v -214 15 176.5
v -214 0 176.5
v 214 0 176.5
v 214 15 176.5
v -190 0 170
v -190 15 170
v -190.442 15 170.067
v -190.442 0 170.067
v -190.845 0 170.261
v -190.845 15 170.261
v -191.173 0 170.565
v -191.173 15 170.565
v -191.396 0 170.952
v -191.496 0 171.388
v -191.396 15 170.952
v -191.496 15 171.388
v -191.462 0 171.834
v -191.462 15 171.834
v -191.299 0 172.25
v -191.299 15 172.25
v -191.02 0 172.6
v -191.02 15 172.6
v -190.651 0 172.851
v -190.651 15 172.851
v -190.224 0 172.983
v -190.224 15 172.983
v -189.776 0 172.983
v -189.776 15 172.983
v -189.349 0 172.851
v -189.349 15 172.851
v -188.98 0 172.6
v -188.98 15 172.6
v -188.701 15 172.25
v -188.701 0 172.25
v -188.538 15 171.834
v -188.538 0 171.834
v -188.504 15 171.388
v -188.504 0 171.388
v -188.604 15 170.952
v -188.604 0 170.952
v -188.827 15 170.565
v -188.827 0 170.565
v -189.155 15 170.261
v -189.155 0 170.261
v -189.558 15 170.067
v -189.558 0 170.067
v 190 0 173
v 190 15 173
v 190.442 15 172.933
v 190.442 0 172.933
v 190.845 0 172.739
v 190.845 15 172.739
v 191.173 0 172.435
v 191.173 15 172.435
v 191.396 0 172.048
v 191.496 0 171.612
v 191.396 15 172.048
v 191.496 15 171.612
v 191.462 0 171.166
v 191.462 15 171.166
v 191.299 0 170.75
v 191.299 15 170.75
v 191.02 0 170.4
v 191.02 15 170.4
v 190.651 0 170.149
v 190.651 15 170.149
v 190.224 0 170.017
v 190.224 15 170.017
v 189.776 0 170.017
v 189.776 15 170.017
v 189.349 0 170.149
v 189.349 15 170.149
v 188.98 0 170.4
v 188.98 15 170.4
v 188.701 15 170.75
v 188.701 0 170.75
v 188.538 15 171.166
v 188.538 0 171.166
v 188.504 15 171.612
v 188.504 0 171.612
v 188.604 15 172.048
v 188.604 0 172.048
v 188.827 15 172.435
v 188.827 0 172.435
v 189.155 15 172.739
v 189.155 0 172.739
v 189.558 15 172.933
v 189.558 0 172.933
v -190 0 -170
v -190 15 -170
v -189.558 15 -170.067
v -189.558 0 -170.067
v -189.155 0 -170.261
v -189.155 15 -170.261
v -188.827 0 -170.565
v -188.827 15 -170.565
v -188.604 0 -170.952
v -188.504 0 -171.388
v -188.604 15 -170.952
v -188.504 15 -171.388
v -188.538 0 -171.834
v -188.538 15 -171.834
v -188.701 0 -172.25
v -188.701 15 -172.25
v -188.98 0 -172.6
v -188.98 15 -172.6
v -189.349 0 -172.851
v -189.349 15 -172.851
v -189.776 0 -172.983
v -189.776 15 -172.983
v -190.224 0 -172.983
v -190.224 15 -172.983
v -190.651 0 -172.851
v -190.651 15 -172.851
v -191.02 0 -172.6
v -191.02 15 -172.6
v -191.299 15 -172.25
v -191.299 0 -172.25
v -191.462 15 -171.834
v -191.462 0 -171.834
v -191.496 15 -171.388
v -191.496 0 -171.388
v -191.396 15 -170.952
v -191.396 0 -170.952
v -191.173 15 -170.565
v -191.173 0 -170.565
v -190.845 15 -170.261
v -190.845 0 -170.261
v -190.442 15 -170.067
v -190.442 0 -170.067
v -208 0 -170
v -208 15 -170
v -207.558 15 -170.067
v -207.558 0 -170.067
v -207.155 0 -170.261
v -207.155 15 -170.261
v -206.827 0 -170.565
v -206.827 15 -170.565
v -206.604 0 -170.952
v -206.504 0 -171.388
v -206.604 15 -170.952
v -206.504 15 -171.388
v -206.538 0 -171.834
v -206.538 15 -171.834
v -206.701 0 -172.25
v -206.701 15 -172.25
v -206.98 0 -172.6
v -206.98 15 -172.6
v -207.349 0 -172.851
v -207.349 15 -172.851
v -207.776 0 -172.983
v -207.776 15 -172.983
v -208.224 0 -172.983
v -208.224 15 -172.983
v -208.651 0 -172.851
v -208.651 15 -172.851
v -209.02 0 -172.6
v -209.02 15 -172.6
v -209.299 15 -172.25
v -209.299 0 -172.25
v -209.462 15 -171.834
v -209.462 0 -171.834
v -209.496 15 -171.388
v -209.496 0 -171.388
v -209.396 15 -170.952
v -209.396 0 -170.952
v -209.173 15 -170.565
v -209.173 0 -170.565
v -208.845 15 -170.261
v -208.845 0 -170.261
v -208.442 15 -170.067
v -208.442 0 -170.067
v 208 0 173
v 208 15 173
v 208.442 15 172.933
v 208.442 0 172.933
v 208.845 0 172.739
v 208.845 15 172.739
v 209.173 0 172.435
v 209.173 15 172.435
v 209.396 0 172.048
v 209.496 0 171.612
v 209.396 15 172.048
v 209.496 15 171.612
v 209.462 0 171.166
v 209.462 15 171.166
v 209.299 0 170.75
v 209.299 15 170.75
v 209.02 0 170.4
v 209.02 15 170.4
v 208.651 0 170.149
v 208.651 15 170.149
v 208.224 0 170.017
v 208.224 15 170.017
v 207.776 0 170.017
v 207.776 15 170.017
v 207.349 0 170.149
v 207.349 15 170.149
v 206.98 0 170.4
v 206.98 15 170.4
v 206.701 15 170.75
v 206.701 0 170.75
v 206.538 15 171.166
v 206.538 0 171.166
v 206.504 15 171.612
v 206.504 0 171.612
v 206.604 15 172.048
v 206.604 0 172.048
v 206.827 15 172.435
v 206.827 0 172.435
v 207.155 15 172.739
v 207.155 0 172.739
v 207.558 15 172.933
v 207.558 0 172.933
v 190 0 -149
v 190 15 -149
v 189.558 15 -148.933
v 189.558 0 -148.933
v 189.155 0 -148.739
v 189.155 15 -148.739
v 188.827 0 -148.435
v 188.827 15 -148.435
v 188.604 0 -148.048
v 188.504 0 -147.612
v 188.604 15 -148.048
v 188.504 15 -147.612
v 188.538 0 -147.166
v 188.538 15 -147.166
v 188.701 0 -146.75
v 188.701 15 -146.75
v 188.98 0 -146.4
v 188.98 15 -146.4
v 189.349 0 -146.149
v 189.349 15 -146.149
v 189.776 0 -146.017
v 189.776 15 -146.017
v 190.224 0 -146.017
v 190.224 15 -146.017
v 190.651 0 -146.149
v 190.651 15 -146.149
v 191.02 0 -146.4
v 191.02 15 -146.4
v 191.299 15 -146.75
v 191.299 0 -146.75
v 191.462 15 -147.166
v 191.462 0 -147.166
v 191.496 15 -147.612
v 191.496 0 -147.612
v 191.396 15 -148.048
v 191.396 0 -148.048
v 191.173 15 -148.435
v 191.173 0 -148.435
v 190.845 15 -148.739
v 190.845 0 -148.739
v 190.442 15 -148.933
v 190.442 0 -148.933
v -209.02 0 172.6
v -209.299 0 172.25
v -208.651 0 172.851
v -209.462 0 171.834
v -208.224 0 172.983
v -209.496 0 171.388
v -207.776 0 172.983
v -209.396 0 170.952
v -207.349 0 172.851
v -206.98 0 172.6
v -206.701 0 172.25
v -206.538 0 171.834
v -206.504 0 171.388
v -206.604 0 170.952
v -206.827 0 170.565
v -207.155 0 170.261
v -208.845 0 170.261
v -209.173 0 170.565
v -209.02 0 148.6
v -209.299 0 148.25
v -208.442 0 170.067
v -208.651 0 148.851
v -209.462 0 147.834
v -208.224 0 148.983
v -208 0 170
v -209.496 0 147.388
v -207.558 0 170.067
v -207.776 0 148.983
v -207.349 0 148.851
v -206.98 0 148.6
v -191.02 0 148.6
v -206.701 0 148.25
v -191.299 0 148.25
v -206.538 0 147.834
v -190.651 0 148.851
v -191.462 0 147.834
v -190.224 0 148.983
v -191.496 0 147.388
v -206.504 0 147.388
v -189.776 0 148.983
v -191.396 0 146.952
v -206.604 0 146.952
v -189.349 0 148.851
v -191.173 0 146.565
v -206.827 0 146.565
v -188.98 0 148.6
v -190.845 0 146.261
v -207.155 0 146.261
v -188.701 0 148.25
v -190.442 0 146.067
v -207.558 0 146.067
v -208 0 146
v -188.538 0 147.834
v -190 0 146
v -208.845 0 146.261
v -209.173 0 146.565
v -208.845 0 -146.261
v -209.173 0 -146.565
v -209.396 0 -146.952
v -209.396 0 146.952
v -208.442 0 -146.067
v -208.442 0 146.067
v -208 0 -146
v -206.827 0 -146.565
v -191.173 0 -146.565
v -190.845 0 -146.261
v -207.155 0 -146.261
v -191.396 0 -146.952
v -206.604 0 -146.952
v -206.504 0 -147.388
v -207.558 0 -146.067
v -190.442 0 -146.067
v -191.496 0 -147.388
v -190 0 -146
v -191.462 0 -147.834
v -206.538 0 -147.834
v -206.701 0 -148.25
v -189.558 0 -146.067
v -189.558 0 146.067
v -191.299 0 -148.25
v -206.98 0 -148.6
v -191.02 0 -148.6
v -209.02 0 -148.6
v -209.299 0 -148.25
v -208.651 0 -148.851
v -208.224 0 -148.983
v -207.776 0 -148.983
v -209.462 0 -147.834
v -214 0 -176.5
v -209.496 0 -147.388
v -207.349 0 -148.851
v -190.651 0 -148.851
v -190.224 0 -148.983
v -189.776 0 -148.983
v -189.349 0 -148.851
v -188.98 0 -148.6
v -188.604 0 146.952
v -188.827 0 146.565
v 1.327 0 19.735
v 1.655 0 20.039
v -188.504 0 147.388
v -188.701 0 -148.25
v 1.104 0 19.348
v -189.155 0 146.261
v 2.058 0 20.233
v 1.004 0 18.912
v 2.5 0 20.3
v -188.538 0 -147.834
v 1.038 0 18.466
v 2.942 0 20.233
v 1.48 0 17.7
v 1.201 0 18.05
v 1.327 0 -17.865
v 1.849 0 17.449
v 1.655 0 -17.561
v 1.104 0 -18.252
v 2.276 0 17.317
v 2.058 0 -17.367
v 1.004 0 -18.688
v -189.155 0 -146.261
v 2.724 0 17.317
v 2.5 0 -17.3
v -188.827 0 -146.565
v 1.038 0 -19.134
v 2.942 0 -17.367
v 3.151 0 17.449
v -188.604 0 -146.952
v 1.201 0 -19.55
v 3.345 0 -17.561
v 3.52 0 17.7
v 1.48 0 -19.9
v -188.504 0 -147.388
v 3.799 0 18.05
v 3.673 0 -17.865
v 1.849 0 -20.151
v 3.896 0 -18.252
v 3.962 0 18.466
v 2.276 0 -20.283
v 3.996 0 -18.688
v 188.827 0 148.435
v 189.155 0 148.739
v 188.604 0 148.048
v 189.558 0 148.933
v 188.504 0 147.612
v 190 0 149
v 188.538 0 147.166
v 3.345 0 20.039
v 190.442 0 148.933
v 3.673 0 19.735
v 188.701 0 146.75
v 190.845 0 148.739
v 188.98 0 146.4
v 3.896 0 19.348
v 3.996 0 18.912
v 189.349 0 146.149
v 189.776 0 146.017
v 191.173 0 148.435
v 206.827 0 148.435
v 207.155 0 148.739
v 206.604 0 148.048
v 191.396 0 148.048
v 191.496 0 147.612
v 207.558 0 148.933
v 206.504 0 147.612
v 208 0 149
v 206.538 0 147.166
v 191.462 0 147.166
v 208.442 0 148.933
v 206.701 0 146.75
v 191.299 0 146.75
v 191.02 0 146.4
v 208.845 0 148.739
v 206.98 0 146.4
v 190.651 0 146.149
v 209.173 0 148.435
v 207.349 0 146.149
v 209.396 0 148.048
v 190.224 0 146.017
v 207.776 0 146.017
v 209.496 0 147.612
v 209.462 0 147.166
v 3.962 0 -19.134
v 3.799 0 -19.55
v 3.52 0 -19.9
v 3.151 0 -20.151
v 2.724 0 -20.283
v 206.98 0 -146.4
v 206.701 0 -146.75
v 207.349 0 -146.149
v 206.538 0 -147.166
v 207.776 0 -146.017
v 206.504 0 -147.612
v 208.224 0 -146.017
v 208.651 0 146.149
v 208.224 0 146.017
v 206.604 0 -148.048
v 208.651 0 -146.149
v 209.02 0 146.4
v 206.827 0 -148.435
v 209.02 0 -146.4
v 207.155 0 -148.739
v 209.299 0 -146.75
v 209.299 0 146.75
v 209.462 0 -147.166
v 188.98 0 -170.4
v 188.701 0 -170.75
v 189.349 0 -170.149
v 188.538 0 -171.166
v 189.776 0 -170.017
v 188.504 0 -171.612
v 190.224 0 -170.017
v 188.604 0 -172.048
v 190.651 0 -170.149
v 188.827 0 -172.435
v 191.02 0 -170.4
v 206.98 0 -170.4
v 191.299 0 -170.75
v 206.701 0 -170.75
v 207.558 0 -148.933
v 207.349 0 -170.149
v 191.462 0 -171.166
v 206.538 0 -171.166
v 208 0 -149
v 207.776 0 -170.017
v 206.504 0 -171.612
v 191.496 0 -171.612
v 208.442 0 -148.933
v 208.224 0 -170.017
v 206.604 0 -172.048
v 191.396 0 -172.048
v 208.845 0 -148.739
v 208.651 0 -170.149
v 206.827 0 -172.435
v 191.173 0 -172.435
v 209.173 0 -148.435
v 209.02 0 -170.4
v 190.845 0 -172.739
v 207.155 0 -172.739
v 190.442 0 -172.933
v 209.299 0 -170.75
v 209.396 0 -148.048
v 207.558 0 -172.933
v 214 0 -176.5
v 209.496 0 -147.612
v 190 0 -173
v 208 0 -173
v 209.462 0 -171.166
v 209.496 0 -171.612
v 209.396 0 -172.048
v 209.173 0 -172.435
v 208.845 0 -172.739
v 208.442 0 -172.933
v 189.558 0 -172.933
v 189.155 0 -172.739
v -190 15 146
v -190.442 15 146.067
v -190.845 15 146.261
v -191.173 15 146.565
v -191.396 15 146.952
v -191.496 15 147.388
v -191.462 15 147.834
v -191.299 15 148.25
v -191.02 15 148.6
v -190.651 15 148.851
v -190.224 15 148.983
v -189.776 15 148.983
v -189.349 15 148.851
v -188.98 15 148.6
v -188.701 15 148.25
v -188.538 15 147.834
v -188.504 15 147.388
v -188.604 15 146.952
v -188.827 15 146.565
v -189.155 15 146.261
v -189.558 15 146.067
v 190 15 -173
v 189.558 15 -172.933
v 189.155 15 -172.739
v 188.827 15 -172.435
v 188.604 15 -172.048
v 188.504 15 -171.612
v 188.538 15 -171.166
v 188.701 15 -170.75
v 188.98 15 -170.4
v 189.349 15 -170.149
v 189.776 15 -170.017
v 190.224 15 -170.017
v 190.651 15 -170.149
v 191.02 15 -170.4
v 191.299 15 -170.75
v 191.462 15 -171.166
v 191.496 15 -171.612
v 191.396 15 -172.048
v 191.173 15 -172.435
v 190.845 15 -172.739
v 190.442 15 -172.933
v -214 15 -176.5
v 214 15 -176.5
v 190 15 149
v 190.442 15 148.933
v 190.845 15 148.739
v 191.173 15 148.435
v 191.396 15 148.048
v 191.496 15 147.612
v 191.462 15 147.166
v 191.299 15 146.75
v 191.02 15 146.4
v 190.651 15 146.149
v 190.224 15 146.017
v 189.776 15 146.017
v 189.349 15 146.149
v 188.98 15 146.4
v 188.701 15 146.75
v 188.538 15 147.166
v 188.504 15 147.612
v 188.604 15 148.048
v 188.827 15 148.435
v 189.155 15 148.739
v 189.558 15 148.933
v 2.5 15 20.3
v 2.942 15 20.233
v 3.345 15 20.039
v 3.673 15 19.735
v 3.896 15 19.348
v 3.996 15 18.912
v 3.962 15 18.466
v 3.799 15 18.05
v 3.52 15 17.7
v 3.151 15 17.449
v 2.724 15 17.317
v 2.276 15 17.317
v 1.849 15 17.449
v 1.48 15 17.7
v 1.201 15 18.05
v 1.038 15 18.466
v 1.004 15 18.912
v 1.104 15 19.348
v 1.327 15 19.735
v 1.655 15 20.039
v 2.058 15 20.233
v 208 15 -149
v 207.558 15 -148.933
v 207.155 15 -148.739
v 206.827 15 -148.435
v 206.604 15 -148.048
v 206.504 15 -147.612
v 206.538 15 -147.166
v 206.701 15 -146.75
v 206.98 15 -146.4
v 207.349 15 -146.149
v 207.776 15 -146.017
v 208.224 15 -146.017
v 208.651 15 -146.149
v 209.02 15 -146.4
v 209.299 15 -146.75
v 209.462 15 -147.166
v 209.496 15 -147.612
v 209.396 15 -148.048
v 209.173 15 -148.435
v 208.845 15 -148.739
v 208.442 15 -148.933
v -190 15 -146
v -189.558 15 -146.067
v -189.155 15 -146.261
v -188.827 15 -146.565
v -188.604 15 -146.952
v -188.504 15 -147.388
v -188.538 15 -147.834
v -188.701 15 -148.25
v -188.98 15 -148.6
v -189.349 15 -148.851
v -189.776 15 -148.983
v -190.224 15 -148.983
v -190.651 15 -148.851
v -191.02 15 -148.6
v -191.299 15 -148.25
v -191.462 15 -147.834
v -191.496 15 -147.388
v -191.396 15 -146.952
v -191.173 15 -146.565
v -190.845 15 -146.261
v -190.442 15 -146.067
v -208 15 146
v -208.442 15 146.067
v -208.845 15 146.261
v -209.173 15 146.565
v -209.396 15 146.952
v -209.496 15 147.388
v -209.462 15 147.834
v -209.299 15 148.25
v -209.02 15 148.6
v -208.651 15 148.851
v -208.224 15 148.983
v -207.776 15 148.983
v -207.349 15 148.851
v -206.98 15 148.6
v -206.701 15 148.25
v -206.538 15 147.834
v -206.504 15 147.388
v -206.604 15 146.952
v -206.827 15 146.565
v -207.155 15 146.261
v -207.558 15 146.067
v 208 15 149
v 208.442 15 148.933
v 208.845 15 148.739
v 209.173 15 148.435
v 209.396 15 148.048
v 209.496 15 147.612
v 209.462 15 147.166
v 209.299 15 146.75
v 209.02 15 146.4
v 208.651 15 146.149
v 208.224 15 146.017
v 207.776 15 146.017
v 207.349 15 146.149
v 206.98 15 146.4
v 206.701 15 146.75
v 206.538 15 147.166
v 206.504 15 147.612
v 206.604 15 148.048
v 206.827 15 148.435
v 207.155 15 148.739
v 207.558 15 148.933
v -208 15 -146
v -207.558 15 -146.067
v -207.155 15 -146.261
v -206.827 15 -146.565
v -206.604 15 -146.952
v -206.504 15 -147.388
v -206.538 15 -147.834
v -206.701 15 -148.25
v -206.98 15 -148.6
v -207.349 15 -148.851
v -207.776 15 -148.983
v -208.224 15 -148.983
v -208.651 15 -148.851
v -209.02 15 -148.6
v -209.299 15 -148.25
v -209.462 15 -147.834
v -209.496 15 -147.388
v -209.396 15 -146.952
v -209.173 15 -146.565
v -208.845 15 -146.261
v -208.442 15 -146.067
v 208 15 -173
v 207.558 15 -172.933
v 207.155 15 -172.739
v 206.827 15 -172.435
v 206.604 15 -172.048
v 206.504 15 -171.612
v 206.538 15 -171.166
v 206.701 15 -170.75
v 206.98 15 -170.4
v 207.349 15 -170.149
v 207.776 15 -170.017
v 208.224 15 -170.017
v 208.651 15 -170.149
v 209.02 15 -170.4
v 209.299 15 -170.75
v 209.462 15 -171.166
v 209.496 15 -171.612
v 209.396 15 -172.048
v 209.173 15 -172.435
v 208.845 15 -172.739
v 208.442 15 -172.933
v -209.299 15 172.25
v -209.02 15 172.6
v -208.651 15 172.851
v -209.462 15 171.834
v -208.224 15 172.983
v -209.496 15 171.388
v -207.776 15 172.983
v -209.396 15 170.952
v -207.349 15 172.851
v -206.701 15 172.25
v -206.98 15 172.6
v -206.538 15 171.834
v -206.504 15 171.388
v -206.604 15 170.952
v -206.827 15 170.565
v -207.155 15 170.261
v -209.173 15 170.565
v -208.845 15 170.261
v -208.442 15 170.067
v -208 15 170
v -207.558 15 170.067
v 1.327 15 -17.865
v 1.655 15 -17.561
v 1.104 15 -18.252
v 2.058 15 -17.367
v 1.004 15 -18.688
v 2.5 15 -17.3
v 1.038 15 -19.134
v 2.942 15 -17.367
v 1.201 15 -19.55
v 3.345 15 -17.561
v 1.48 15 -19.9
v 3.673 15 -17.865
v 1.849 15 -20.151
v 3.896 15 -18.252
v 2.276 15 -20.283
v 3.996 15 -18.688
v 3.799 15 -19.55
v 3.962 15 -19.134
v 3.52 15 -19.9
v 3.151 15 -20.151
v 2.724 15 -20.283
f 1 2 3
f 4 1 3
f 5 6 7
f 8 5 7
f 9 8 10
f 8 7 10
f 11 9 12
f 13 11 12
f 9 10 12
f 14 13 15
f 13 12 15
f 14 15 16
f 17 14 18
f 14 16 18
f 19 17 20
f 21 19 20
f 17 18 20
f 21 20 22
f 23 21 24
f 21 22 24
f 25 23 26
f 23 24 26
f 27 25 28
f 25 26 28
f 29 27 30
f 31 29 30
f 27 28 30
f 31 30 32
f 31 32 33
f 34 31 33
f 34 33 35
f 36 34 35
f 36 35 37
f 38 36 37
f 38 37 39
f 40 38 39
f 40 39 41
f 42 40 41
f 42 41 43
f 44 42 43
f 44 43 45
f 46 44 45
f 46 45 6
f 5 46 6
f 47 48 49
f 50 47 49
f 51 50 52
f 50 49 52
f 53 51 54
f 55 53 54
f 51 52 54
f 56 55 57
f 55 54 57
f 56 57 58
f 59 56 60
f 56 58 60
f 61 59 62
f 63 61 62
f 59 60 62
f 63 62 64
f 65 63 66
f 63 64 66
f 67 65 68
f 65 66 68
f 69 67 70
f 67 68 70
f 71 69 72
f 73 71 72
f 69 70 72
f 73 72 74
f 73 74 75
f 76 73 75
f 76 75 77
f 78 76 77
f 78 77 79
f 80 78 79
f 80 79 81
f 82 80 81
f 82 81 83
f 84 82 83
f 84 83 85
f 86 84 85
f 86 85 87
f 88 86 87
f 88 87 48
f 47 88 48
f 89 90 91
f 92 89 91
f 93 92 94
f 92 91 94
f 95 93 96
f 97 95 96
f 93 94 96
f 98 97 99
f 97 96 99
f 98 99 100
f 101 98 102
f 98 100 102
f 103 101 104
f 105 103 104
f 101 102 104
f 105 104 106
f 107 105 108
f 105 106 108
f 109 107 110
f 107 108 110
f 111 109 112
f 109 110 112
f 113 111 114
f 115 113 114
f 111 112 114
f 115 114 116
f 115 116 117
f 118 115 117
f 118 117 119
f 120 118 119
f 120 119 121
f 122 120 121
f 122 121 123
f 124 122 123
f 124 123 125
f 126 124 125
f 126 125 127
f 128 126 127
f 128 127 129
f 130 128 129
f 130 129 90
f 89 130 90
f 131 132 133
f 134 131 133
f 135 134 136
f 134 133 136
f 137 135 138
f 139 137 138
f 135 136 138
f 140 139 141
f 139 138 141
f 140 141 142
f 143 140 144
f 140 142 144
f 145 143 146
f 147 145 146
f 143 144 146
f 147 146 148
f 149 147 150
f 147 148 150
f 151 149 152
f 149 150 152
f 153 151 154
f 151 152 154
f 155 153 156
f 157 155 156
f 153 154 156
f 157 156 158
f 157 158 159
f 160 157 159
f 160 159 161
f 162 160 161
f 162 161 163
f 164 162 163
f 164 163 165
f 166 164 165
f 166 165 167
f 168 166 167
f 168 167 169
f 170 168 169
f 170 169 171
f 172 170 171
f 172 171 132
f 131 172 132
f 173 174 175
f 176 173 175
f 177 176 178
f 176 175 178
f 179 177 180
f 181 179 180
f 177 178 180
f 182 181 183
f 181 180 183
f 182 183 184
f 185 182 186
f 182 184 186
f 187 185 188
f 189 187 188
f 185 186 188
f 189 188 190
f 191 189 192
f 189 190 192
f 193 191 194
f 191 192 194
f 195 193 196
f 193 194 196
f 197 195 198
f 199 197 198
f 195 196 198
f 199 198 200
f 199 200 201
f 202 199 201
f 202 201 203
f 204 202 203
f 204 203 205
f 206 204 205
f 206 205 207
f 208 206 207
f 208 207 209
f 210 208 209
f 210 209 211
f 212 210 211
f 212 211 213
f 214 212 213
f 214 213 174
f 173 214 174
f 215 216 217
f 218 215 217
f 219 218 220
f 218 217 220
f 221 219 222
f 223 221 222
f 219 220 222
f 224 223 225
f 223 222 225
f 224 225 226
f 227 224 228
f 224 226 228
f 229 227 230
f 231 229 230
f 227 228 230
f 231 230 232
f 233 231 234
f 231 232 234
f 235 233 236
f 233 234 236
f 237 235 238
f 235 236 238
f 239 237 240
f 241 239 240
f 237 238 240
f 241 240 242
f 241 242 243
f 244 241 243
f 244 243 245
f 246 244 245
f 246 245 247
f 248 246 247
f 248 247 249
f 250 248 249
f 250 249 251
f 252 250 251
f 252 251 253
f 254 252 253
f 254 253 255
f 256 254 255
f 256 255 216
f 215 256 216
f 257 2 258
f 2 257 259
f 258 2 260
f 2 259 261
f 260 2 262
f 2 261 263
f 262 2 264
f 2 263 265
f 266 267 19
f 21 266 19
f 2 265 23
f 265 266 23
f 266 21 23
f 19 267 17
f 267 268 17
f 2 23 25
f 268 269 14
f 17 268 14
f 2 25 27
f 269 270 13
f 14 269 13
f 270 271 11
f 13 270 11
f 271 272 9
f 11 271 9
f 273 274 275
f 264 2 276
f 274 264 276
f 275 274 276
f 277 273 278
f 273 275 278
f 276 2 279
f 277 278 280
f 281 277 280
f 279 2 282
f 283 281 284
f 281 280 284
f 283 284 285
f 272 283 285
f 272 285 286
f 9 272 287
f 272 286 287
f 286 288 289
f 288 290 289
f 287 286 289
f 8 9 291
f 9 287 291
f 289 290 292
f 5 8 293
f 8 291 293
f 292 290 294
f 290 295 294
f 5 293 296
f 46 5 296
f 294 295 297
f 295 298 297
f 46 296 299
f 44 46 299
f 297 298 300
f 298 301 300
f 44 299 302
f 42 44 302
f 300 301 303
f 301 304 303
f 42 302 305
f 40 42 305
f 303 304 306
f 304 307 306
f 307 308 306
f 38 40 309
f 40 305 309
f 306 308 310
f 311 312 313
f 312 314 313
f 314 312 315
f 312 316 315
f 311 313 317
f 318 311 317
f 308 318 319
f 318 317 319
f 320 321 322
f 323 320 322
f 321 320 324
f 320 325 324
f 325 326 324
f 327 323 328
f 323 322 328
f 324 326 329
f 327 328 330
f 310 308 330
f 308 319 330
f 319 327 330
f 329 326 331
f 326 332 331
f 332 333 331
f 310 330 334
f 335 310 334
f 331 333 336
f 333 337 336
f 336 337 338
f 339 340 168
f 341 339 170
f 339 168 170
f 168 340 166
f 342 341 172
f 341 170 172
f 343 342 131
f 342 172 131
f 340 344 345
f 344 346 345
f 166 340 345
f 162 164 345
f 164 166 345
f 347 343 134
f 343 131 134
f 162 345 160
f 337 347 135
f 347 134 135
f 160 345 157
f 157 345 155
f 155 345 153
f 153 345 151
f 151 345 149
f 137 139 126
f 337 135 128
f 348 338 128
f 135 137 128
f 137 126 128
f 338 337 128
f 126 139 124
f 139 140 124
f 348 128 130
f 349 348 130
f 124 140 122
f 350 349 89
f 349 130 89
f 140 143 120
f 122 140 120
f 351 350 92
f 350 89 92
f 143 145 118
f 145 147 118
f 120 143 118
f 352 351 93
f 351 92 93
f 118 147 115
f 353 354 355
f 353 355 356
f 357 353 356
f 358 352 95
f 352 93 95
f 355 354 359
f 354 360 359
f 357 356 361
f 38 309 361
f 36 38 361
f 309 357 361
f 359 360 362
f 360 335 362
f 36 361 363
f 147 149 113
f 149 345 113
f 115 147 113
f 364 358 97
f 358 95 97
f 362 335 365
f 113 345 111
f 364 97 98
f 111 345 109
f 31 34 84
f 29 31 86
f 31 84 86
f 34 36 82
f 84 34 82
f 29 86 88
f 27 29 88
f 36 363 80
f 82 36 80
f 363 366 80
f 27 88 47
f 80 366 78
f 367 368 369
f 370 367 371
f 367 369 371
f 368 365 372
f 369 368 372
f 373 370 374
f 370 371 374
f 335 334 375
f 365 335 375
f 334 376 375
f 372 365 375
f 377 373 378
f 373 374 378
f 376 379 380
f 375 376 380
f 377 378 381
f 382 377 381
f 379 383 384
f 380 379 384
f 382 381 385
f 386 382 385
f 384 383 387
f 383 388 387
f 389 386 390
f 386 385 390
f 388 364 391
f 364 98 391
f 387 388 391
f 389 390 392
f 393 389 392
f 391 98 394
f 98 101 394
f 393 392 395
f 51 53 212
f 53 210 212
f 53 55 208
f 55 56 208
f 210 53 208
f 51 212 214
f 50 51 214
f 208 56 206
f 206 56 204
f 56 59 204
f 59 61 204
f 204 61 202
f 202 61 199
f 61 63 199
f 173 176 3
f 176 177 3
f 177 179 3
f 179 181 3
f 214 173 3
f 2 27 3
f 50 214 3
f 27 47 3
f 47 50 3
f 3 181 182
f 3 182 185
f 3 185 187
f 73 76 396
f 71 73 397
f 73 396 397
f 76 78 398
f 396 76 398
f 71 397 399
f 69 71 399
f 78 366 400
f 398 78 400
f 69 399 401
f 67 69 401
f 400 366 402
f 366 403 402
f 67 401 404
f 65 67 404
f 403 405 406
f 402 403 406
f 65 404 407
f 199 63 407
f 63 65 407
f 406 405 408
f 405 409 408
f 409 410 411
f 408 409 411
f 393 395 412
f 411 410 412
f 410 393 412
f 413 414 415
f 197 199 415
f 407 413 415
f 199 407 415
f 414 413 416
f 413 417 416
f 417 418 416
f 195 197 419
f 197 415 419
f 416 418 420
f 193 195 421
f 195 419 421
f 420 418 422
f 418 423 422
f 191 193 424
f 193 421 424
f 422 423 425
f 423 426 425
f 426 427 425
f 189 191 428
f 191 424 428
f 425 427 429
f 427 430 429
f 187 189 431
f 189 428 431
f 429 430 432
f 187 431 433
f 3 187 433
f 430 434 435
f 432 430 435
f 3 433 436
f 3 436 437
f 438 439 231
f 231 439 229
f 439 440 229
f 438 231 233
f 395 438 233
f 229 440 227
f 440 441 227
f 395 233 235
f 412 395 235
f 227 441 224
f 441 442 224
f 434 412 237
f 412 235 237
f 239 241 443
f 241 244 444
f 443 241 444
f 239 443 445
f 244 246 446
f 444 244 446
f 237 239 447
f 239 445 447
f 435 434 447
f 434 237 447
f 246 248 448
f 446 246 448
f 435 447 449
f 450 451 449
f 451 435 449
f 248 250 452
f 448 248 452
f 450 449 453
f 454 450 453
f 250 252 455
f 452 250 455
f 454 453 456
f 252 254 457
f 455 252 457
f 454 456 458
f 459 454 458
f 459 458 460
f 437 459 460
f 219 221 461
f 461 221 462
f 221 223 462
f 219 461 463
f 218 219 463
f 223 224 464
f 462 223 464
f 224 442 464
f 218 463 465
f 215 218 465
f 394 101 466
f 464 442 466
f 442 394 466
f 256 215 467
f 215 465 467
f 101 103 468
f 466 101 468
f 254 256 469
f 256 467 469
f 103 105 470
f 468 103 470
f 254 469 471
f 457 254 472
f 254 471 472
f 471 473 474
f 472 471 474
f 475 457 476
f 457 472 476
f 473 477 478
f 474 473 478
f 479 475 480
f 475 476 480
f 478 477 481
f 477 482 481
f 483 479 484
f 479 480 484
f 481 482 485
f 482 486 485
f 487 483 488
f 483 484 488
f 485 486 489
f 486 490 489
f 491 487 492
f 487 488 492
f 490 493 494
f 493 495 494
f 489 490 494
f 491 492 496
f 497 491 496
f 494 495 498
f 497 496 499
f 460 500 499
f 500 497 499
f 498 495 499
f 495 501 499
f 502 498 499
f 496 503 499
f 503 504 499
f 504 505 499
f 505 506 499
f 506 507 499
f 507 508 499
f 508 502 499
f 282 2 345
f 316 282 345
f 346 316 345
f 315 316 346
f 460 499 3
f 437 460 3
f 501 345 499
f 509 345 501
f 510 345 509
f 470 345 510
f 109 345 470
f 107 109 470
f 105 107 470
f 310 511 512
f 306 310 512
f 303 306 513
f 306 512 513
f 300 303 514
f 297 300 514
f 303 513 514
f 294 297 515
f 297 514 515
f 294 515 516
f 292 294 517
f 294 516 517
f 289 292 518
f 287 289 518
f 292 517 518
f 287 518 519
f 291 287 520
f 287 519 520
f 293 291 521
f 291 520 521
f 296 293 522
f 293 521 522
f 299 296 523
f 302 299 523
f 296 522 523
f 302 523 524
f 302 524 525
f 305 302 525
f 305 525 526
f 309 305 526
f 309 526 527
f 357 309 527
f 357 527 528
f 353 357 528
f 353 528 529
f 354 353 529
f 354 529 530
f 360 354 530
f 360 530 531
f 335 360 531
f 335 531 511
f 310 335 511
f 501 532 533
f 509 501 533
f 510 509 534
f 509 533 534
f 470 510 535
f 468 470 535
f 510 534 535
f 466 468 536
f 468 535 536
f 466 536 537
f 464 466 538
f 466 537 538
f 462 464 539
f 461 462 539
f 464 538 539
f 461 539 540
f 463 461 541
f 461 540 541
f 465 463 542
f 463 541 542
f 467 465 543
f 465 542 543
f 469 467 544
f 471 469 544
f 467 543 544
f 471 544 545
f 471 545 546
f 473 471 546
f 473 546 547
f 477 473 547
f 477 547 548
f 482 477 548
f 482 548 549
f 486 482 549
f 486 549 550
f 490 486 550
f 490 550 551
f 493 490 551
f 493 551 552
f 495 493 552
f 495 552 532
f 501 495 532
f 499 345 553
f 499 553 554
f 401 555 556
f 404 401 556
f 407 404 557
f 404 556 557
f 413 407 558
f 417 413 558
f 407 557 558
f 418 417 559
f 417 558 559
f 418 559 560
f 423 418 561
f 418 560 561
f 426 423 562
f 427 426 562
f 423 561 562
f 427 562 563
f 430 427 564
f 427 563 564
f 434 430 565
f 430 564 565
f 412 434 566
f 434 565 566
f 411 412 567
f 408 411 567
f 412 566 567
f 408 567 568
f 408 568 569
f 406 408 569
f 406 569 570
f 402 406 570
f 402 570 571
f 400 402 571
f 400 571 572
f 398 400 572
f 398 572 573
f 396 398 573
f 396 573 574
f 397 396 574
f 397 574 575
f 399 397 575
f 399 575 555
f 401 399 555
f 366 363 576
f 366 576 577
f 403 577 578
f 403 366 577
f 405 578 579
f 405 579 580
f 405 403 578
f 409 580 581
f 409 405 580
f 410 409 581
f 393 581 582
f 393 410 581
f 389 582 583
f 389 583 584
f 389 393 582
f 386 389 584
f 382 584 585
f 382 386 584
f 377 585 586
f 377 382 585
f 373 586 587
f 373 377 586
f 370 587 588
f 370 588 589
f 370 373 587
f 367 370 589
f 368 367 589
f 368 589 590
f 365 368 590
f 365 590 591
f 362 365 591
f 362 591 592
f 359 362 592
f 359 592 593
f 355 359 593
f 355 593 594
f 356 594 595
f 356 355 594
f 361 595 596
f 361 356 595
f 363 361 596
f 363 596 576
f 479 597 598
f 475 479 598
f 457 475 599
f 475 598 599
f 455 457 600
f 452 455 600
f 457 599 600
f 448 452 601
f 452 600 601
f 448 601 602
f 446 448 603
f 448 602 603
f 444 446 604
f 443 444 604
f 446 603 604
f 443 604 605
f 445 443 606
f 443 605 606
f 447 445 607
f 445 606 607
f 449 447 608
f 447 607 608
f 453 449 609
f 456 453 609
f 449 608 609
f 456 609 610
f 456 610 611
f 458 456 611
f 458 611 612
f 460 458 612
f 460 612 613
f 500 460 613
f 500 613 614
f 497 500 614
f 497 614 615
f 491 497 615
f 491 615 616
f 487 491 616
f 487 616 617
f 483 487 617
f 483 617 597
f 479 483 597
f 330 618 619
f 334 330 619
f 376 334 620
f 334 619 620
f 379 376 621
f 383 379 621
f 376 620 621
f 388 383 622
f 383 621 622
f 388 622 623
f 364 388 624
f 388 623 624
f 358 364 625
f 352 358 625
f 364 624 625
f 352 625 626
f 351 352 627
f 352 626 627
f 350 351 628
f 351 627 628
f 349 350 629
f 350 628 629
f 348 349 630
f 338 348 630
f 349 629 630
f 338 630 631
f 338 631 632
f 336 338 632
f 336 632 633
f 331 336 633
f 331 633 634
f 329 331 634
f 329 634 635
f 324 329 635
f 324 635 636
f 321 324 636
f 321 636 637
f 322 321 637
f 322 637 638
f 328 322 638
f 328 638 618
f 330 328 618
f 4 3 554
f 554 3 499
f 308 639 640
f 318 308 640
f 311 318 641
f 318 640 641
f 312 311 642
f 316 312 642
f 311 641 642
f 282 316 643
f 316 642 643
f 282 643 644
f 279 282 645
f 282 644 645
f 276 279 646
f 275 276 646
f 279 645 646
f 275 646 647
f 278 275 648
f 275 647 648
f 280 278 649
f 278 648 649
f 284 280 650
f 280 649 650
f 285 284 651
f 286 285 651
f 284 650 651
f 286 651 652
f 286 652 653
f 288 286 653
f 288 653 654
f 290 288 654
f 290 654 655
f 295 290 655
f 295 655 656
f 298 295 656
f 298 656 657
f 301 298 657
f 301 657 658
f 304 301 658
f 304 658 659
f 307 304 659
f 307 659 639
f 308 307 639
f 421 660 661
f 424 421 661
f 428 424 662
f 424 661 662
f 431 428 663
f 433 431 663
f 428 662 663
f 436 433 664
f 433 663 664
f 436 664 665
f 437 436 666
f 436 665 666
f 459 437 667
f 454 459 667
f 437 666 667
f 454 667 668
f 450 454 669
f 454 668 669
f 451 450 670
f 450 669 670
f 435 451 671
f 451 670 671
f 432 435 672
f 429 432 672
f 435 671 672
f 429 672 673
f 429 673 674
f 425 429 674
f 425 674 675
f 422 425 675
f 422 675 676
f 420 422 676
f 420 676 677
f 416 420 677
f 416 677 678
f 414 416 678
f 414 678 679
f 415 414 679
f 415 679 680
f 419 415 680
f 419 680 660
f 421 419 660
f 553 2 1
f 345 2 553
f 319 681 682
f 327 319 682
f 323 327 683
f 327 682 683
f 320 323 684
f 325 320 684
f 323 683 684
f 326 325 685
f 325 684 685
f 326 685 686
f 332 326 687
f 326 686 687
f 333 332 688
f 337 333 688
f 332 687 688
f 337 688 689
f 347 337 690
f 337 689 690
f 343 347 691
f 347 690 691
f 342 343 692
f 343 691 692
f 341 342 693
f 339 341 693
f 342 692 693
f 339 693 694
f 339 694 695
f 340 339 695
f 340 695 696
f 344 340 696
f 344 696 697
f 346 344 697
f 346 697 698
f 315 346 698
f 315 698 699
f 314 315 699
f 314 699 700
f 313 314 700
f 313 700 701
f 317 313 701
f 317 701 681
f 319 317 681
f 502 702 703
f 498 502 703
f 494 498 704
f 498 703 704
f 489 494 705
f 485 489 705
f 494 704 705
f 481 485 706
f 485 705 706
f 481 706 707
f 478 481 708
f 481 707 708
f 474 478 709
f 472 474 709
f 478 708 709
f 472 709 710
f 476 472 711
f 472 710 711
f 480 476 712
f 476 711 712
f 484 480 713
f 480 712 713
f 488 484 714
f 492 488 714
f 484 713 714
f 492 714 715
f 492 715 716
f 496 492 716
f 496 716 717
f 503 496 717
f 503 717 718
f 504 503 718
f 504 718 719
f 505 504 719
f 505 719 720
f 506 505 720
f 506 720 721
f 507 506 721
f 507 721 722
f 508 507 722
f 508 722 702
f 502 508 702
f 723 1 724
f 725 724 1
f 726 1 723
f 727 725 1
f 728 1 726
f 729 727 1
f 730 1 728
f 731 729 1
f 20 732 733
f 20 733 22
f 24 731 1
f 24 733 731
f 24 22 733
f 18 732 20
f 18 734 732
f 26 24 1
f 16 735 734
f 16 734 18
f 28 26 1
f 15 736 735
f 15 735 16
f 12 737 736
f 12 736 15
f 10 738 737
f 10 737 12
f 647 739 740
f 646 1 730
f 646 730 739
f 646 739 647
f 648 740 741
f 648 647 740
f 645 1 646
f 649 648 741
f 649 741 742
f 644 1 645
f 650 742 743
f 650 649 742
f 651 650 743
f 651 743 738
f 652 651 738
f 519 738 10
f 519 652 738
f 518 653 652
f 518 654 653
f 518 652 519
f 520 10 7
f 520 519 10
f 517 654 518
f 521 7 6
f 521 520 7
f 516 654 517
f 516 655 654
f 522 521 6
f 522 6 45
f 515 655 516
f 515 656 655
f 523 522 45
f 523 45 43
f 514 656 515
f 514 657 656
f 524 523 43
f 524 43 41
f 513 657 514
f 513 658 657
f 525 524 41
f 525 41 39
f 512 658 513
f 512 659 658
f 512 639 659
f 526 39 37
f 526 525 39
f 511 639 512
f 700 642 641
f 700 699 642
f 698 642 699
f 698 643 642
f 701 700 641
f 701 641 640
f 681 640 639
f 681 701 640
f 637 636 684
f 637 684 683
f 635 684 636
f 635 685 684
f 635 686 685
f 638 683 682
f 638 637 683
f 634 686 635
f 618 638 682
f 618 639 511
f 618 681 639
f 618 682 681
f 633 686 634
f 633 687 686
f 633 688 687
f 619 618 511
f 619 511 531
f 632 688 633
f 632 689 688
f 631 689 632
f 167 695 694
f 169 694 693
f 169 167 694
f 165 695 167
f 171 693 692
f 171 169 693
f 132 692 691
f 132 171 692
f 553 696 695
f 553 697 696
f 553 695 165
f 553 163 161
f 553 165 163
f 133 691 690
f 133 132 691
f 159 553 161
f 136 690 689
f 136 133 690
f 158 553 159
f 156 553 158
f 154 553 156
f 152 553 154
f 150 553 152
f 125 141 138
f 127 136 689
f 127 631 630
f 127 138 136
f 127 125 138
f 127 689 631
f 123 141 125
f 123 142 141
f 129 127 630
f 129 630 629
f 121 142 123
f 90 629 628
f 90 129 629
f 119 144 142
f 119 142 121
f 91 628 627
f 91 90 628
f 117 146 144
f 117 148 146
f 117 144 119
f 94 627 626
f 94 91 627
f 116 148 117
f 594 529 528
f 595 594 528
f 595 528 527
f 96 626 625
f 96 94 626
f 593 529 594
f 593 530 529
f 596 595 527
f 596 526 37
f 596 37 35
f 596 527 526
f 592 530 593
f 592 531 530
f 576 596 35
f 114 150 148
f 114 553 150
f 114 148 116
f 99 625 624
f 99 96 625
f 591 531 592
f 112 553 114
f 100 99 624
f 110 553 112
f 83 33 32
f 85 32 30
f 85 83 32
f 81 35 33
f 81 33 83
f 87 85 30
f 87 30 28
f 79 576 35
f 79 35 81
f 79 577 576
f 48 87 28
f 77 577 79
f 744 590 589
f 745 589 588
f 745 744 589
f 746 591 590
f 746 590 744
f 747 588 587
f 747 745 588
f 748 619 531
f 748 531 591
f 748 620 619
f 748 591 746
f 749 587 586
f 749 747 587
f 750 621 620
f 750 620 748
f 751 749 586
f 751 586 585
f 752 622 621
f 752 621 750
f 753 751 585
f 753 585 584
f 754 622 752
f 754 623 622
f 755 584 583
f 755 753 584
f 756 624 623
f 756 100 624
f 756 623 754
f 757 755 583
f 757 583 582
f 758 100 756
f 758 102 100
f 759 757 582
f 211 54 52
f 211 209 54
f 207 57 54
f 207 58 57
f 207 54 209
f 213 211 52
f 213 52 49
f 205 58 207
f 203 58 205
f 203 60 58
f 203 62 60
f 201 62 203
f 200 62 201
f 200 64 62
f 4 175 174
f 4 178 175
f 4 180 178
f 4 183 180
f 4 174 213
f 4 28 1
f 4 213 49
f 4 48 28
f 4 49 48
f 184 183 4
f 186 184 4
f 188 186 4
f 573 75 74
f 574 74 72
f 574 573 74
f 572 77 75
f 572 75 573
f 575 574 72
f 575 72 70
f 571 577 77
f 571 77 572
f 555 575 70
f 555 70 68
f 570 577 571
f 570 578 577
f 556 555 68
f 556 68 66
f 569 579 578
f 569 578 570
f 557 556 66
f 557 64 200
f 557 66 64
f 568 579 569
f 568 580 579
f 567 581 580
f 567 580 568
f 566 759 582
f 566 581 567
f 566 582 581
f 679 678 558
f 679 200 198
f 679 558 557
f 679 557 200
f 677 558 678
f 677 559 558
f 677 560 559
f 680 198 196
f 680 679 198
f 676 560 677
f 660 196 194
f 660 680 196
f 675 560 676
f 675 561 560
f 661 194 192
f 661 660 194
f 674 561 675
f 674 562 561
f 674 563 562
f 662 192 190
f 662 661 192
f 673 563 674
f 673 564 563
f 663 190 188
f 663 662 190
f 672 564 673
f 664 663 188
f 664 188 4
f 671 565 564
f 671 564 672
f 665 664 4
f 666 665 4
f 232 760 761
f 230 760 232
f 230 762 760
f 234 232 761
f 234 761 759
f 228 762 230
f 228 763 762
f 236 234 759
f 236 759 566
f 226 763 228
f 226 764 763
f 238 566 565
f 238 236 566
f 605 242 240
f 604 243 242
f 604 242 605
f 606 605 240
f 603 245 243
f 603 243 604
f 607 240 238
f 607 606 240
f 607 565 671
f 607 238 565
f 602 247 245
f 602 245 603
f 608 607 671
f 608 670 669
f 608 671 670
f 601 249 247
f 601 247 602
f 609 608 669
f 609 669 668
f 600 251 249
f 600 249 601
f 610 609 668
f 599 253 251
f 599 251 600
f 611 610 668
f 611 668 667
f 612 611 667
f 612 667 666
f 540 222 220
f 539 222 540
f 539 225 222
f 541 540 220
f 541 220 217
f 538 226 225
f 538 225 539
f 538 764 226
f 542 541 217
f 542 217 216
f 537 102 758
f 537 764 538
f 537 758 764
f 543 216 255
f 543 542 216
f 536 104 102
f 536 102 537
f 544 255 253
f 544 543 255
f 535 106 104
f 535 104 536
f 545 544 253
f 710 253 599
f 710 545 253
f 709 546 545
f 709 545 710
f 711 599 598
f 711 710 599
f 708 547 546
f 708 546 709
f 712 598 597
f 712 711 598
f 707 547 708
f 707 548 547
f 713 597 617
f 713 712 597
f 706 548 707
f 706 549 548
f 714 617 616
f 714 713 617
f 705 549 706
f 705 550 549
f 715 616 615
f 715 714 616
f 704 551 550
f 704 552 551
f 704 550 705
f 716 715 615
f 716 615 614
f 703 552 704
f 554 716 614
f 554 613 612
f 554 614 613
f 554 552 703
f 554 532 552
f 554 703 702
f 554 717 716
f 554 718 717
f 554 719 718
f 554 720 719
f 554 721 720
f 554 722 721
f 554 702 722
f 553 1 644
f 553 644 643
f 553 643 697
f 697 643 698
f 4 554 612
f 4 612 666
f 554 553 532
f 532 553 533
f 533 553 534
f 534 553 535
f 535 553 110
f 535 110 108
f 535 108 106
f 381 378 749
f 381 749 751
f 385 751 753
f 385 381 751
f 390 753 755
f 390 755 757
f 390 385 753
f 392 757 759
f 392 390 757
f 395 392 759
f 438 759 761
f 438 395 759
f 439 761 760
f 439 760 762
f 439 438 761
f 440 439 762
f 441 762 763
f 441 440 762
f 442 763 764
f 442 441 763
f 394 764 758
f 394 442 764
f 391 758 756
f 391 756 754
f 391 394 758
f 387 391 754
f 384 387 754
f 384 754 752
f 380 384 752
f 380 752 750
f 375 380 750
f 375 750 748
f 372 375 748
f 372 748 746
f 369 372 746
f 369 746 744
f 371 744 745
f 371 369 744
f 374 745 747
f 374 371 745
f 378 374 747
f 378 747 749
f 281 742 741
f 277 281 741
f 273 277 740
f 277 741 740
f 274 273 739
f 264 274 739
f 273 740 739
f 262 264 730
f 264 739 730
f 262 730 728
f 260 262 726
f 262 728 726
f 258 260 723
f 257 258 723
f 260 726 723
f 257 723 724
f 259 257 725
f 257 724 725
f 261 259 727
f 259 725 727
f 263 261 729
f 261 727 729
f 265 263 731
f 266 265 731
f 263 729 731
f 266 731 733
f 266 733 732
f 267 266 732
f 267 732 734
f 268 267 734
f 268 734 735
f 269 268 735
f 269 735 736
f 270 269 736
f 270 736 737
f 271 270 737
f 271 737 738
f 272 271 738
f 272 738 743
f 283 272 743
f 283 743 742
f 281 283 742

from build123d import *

# Parameters (mm, degrees)
CROQUIS1_W              = 428
CROQUIS1_H              = 353
CROQUIS1_R              = 1.5
SALIENTE_EXTRUIR1_DEPTH = 15
CROQUIS3_R              = 1.5
CORTAR_EXTRUIR1_DEPTH   = 278.80073794


with BuildPart() as part:
    # Croquis1 → Saliente-Extruir1 (new body)
    with BuildSketch(Plane(origin=(0, 0, 0), x_dir=(1, 0, 0), z_dir=(0, 1, 0))):
        Rectangle(CROQUIS1_W, CROQUIS1_H)
        with Locations(Location((2.5, 18.8, 0), (0, 0, 270))):
            Circle(CROQUIS1_R, mode=Mode.SUBTRACT)
        with Locations(Location((2.5, -18.8, 0), (0, 0, 270))):
            Circle(CROQUIS1_R, mode=Mode.SUBTRACT)
    extrude(amount=SALIENTE_EXTRUIR1_DEPTH)

    # Croquis3 → Cortar-Extruir1 (cut, through all)
    with BuildSketch(Plane(origin=(0, 15, 0), x_dir=(1, 0, 0), z_dir=(0, 1, 0))):
        with Locations(Location((208, -171.5, 0), (0, 0, 270))):
            Circle(CROQUIS3_R)
        with Locations(Location((190, -171.5, 0), (0, 0, 270))):
            Circle(CROQUIS3_R)
        with Locations(Location((190, -147.5, 0), (0, 0, 270))):
            Circle(CROQUIS3_R)
        with Locations(Location((208, -147.5, 0), (0, 0, 270))):
            Circle(CROQUIS3_R)
        with Locations(Location((-208, -171.5, 0), (0, 0, 90))):
            Circle(CROQUIS3_R)
        with Locations(Location((-190, -171.5, 0), (0, 0, 90))):
            Circle(CROQUIS3_R)
        with Locations(Location((-208, -147.5, 0), (0, 0, 90))):
            Circle(CROQUIS3_R)
        with Locations(Location((-190, -147.5, 0), (0, 0, 90))):
            Circle(CROQUIS3_R)
        with Locations(Location((-208, 171.5, 0), (0, 0, 270))):
            Circle(CROQUIS3_R)
        with Locations(Location((-190, 171.5, 0), (0, 0, 270))):
            Circle(CROQUIS3_R)
        with Locations(Location((-190, 147.5, 0), (0, 0, 270))):
            Circle(CROQUIS3_R)
        with Locations(Location((-208, 147.5, 0), (0, 0, 270))):
            Circle(CROQUIS3_R)
        with Locations(Location((208, 171.5, 0), (0, 0, 90))):
            Circle(CROQUIS3_R)
        with Locations(Location((190, 171.5, 0), (0, 0, 90))):
            Circle(CROQUIS3_R)
        with Locations(Location((190, 147.5, 0), (0, 0, 90))):
            Circle(CROQUIS3_R)
        with Locations(Location((208, 147.5, 0), (0, 0, 90))):
            Circle(CROQUIS3_R)
    extrude(amount=-CORTAR_EXTRUIR1_DEPTH, mode=Mode.SUBTRACT)


solid = part.part
